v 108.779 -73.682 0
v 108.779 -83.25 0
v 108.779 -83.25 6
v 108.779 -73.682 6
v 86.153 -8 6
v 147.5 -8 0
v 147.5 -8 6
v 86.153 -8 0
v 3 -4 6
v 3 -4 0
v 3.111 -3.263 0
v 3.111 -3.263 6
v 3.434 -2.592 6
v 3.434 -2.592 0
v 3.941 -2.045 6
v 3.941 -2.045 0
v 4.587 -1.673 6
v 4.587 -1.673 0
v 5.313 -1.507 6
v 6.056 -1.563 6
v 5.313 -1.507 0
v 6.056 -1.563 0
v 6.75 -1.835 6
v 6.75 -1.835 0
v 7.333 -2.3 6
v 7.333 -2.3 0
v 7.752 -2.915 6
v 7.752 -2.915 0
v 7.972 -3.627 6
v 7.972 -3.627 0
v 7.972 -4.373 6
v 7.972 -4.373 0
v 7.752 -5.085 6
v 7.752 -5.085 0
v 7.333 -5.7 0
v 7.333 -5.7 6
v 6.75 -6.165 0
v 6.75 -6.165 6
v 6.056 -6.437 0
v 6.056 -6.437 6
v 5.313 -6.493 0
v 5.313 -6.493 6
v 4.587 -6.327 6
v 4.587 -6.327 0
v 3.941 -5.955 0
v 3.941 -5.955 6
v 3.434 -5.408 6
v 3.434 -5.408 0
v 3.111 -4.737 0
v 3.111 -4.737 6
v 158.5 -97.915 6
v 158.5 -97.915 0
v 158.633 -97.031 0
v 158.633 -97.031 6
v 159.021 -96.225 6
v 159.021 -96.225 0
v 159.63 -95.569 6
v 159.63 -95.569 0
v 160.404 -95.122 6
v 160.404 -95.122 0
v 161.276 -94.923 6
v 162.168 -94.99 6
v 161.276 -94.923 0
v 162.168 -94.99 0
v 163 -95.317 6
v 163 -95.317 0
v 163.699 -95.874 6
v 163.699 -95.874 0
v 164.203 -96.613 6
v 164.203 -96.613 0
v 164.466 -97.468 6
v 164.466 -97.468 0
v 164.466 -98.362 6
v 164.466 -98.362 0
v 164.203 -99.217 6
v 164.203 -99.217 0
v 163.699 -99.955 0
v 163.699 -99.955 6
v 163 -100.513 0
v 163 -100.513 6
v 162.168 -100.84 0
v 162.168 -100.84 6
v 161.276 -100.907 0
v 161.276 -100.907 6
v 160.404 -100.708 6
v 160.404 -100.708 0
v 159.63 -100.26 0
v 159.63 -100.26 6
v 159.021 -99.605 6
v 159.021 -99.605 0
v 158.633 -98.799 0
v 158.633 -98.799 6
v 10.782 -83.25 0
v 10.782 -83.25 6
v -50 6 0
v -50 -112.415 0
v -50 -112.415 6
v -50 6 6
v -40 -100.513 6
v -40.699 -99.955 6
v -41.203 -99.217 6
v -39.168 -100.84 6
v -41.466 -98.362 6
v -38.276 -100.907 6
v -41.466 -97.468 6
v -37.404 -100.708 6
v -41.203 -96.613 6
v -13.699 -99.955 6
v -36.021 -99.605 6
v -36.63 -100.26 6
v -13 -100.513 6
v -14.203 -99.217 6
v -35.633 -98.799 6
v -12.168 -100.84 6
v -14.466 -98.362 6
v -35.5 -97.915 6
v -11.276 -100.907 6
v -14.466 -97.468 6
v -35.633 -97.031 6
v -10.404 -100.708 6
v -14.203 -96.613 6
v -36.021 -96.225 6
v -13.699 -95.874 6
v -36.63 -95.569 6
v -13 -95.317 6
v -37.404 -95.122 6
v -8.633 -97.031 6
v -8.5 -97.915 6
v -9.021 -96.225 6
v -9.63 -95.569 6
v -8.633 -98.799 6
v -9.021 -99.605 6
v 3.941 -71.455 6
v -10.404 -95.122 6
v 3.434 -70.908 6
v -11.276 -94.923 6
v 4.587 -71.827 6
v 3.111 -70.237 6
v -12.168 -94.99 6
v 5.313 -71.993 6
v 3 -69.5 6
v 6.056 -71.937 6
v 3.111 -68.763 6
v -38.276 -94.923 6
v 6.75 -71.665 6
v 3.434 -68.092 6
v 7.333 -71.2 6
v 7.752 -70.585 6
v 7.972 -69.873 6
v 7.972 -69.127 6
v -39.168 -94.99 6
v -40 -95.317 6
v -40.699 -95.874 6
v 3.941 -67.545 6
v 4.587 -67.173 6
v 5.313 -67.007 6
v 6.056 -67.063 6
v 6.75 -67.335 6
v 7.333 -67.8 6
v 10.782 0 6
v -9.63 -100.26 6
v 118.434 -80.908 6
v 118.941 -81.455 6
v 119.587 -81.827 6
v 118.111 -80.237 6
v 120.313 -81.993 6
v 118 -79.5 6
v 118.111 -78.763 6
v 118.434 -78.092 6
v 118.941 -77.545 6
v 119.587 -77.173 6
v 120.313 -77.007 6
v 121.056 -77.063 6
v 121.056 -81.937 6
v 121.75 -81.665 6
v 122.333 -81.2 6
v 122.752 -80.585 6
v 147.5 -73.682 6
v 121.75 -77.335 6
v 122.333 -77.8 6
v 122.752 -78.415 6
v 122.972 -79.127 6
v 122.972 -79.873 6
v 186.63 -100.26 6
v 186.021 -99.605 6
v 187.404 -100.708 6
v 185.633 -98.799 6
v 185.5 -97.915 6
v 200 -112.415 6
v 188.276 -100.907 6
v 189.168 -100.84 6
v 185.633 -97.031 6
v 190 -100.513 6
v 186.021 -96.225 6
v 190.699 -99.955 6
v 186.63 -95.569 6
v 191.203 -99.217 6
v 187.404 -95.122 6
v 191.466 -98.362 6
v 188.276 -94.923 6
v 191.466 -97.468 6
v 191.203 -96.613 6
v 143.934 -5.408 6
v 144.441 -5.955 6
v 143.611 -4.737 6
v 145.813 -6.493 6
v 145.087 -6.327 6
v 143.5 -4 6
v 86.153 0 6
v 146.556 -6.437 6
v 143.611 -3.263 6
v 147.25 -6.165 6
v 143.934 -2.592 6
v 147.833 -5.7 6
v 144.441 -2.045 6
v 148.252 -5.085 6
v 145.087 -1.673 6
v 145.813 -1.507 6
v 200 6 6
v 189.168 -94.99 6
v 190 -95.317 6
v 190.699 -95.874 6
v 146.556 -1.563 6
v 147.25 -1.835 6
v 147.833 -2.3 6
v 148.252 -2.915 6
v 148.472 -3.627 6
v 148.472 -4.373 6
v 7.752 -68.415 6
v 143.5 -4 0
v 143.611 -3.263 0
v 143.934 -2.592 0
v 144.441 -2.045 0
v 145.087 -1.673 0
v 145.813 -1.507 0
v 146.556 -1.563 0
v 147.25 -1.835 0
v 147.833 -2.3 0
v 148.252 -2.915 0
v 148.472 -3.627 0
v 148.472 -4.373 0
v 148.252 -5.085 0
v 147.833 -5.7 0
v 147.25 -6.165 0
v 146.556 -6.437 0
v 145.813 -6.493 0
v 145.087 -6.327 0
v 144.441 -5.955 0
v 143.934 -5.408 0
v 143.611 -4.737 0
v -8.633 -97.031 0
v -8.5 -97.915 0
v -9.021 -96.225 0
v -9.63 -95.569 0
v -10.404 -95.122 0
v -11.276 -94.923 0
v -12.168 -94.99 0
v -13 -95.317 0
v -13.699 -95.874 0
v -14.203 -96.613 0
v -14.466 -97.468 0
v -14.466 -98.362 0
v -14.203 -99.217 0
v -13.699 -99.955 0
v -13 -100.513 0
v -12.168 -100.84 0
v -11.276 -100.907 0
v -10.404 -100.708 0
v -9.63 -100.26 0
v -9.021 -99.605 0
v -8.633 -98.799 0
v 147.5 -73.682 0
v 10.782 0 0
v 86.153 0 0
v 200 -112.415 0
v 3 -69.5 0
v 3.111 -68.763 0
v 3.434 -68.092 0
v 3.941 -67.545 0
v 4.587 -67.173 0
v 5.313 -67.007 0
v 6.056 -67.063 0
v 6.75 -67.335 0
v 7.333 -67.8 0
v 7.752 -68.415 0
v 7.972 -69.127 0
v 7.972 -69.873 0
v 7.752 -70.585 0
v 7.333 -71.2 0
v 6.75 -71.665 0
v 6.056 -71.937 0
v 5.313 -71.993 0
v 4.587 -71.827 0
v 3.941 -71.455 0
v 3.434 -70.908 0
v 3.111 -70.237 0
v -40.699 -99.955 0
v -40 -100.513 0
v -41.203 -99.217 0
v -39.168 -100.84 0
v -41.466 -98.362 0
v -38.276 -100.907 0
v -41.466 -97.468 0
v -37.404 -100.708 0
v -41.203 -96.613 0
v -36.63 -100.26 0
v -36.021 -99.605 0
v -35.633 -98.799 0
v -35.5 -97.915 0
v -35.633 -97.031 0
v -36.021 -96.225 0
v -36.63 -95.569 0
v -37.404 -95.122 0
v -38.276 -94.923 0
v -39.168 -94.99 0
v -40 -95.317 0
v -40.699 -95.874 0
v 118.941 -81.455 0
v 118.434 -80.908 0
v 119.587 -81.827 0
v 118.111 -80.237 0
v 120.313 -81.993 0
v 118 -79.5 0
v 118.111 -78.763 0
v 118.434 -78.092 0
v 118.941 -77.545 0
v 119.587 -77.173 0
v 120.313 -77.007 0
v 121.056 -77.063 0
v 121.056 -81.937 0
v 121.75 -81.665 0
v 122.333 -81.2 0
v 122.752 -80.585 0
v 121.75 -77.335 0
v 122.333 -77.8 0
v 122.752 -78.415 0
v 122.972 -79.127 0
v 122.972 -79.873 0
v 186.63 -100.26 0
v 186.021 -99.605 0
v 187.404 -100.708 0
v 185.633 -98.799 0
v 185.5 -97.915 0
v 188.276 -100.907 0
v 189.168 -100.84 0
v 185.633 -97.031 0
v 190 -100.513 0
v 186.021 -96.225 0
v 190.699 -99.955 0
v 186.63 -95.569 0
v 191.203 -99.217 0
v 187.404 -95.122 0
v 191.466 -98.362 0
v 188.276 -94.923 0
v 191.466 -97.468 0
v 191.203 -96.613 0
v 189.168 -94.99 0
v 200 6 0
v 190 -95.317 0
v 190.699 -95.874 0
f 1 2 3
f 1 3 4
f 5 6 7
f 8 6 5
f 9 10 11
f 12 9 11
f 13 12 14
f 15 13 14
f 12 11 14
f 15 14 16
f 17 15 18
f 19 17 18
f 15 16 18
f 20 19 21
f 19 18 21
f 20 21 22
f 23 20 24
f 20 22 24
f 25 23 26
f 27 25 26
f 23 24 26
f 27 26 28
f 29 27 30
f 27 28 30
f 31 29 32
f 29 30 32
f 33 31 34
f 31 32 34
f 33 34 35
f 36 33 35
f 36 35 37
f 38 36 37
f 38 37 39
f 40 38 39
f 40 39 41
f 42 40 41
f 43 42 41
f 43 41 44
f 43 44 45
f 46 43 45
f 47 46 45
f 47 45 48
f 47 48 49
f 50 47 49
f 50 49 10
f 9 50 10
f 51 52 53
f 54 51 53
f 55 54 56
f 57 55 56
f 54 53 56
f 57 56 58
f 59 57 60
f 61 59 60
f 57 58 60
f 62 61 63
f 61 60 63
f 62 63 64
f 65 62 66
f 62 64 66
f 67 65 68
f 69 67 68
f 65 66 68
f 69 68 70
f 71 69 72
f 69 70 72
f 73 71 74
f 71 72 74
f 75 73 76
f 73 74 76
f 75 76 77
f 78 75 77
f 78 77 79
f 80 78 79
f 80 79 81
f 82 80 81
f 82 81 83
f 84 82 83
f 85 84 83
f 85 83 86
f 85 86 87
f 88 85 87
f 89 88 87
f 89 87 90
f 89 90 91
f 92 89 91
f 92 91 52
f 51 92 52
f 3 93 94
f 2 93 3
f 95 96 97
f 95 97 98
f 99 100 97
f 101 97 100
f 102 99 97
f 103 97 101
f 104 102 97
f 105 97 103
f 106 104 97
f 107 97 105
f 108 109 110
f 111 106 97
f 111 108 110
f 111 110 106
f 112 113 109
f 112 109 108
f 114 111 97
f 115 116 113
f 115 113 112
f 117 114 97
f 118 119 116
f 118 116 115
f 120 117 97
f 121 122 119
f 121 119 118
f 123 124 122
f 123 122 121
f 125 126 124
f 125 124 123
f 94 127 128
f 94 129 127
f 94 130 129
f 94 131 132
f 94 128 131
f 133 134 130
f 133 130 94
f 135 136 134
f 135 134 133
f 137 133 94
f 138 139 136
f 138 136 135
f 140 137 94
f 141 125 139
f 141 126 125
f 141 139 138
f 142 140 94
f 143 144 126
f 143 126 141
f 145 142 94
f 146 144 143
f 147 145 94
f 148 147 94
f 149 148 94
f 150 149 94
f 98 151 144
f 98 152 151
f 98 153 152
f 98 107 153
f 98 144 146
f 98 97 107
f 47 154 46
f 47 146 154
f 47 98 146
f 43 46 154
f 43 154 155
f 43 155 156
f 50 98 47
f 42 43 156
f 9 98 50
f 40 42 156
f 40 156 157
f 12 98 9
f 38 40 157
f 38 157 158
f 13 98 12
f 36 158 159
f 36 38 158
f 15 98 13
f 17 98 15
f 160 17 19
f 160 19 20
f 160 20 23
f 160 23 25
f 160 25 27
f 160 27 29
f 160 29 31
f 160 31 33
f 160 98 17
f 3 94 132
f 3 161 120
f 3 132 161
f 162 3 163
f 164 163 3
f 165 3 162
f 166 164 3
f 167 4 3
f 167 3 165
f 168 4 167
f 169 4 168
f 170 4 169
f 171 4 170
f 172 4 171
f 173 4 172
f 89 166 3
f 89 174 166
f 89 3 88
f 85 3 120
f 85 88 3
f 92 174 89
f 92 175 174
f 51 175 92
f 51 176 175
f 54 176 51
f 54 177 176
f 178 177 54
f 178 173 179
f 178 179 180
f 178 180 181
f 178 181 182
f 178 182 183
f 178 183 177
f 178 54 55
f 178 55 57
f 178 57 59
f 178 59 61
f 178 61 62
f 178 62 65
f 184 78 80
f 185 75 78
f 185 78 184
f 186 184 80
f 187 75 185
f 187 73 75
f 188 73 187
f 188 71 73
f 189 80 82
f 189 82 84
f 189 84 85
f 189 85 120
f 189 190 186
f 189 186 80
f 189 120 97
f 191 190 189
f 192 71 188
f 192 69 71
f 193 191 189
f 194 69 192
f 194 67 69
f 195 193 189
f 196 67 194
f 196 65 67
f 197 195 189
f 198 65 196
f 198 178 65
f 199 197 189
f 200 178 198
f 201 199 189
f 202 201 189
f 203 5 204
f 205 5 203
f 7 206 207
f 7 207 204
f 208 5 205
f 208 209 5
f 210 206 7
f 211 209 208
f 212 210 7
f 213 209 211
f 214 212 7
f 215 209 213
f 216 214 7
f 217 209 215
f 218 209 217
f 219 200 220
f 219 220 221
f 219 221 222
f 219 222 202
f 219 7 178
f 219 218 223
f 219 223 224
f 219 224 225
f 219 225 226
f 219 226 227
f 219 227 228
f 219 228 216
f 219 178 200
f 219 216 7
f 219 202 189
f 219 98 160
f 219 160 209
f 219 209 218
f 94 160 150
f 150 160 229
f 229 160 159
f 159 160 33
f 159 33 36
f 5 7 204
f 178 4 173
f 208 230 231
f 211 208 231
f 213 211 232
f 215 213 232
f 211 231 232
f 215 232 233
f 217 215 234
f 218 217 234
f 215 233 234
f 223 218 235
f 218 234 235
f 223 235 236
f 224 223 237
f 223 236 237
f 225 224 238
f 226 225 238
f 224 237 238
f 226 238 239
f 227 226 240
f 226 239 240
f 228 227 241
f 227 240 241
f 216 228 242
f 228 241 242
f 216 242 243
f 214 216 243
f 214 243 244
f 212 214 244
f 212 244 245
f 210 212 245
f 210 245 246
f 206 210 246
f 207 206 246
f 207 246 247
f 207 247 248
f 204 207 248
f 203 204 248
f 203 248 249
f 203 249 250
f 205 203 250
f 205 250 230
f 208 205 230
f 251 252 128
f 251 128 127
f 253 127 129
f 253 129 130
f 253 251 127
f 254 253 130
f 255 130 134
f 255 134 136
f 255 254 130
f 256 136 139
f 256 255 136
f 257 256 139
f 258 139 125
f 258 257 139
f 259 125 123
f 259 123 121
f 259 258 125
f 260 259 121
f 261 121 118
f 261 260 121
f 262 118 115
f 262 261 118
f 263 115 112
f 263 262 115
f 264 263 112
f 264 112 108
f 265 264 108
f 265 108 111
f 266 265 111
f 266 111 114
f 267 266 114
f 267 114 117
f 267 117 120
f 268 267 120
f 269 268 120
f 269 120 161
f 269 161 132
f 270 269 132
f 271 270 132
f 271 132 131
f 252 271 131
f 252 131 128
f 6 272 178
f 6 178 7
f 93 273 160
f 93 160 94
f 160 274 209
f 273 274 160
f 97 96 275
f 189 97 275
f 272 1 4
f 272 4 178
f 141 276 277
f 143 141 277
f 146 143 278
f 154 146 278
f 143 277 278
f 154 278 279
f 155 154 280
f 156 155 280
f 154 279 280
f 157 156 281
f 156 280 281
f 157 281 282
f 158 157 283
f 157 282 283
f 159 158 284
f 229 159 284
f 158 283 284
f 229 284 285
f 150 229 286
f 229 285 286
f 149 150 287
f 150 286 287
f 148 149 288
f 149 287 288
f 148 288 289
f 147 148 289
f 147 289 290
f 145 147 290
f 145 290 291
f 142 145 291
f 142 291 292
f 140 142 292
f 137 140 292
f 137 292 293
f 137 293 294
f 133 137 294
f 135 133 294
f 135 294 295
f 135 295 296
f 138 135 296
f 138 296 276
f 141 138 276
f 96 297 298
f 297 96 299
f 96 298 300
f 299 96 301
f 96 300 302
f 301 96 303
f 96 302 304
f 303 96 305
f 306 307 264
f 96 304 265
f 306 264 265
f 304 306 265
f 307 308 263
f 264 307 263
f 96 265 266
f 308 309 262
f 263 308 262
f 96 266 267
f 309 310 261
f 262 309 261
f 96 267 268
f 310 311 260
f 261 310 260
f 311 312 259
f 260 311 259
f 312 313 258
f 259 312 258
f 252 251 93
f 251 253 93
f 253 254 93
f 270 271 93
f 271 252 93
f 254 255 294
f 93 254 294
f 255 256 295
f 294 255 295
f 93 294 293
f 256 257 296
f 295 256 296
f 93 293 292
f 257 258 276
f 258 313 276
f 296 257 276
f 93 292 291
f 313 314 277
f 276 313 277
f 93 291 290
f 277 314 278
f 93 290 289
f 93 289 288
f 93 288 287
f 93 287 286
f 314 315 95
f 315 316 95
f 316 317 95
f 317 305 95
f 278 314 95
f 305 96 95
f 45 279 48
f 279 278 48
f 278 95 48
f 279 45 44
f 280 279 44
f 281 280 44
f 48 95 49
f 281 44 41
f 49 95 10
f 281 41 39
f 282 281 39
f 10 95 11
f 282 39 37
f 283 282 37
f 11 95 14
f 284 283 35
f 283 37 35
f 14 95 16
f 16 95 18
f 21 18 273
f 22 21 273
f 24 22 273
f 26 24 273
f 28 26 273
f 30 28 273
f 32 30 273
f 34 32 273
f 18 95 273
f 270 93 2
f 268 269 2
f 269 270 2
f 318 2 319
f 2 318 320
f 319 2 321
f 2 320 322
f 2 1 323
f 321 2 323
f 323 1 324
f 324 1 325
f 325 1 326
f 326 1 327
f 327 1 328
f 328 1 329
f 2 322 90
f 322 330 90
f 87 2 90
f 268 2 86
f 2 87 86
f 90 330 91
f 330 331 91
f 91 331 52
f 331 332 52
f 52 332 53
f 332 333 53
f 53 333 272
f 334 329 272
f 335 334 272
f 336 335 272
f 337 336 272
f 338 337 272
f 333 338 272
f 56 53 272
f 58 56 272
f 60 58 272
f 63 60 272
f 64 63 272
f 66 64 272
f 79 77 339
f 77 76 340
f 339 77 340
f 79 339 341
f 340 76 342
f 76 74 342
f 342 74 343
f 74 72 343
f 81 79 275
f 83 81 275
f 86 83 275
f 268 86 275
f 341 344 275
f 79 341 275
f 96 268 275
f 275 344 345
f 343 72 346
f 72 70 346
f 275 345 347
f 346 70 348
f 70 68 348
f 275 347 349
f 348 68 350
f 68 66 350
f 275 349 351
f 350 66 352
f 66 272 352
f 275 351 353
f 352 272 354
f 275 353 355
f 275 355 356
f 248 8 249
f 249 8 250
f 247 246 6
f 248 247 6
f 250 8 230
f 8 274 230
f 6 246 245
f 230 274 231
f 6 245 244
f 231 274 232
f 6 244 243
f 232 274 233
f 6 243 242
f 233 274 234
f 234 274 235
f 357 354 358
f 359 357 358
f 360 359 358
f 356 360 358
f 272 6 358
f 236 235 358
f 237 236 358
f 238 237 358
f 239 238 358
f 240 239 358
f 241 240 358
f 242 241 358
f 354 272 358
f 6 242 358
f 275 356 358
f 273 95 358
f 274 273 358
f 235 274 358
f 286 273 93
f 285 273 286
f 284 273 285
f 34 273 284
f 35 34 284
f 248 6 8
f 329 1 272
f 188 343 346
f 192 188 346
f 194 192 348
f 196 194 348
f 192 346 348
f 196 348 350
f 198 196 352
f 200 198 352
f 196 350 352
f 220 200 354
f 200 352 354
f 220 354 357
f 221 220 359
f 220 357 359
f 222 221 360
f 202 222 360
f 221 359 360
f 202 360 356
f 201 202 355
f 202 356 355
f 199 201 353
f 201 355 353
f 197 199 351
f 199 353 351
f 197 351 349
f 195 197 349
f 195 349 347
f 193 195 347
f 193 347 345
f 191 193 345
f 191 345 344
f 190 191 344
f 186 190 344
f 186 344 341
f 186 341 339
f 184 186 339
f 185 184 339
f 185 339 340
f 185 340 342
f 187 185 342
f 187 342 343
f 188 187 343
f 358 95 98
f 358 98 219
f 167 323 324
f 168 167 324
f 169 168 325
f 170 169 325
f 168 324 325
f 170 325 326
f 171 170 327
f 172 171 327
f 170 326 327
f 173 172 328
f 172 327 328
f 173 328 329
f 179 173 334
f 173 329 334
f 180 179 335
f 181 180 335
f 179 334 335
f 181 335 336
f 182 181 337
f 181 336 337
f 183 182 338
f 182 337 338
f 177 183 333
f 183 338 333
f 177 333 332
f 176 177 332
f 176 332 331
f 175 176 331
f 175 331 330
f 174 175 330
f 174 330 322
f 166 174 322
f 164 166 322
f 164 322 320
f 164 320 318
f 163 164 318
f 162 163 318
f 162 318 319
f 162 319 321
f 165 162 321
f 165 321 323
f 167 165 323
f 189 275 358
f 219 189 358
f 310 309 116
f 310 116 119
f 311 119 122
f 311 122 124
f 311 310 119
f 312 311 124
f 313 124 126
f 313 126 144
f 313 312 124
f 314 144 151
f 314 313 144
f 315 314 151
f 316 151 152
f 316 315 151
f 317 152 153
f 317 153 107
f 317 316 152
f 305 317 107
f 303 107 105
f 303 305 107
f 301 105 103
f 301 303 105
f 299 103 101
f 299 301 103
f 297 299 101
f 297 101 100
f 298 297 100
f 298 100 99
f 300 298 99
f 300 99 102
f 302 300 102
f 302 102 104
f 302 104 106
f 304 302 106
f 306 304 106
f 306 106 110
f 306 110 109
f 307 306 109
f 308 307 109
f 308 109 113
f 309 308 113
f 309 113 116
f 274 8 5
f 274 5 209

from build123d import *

# Parameters (mm, degrees)
ESQUISSE1_W             = 250
ESQUISSE1_H             = 118.414906094
BOSS_EXTRU_1_DEPTH      = 6
ENL_V_MAT_EXTRU_1_REACH = 231.506
ENL_V_MAT_EXTRU_2_REACH = 231.506
ESQUISSE3_R             = 2.5
ENL_V_MAT_EXTRU_3_REACH = 231.506
ESQUISSE4_R             = 3


with BuildPart() as part:
    # Esquisse1 → Boss.-Extru.1 (new body)
    with BuildSketch(Plane.XY):
        with Locations((75, -53.207453047)):
            Rectangle(ESQUISSE1_W, ESQUISSE1_H)
    extrude(amount=BOSS_EXTRU_1_DEPTH)

    # Esquisse2 → Enlèv. mat.-Extru.1 (cut, up to next)
    with BuildSketch(Plane(origin=(0, 0, 0), x_dir=(-1, 0, 0), z_dir=(0, 0, -1)), mode=Mode.PRIVATE) as enl_v_mat_extru_1_sk1:
        Polygon((-10.782435162, 0), (-10.782435162, -83.25), (-108.778675483, -83.25), (-108.778675483, -73.68186315), (-147.5, -73.68186315), (-147.5, -8), (-86.152674603, -8), (-86.152674603, 0), align=None)
    enl_v_mat_extru_1_tool1 = extrude(enl_v_mat_extru_1_sk1.sketch, amount=-ENL_V_MAT_EXTRU_1_REACH, mode=Mode.PRIVATE) & part.part
    add(enl_v_mat_extru_1_tool1.solids().sort_by_distance((75.657683, -42.082804, 0))[0], mode=Mode.SUBTRACT)

    # Esquisse3 → Enlèv. mat.-Extru.2 (cut, up to next)
    with BuildSketch(Plane(origin=(0, 0, 0), x_dir=(-1, 0, 0), z_dir=(0, 0, -1)), mode=Mode.PRIVATE) as enl_v_mat_extru_2_sk1:
        with Locations((-5.5, -69.5)):
            Circle(ESQUISSE3_R)
    enl_v_mat_extru_2_tool1 = extrude(enl_v_mat_extru_2_sk1.sketch, amount=-ENL_V_MAT_EXTRU_2_REACH, mode=Mode.PRIVATE) & part.part
    # Esquisse3 → Enlèv. mat.-Extru.2 (cut, up to next)
    with BuildSketch(Plane(origin=(0, 0, 0), x_dir=(-1, 0, 0), z_dir=(0, 0, -1)), mode=Mode.PRIVATE) as enl_v_mat_extru_2_sk2:
        with Locations((-5.5, -4)):
            Circle(ESQUISSE3_R)
    enl_v_mat_extru_2_tool2 = extrude(enl_v_mat_extru_2_sk2.sketch, amount=-ENL_V_MAT_EXTRU_2_REACH, mode=Mode.PRIVATE) & part.part
    # Esquisse3 → Enlèv. mat.-Extru.2 (cut, up to next)
    with BuildSketch(Plane(origin=(0, 0, 0), x_dir=(-1, 0, 0), z_dir=(0, 0, -1)), mode=Mode.PRIVATE) as enl_v_mat_extru_2_sk3:
        with Locations((-146, -4)):
            Circle(ESQUISSE3_R)
    enl_v_mat_extru_2_tool3 = extrude(enl_v_mat_extru_2_sk3.sketch, amount=-ENL_V_MAT_EXTRU_2_REACH, mode=Mode.PRIVATE) & part.part
    # Esquisse3 → Enlèv. mat.-Extru.2 (cut, up to next)
    with BuildSketch(Plane(origin=(0, 0, 0), x_dir=(-1, 0, 0), z_dir=(0, 0, -1)), mode=Mode.PRIVATE) as enl_v_mat_extru_2_sk4:
        with Locations((-120.5, -79.5)):
            Circle(ESQUISSE3_R)
    enl_v_mat_extru_2_tool4 = extrude(enl_v_mat_extru_2_sk4.sketch, amount=-ENL_V_MAT_EXTRU_2_REACH, mode=Mode.PRIVATE) & part.part
    add(enl_v_mat_extru_2_tool1.solids().sort_by_distance((5.5, -69.5, 0))[0], mode=Mode.SUBTRACT)
    add(enl_v_mat_extru_2_tool2.solids().sort_by_distance((5.5, -4, 0))[0], mode=Mode.SUBTRACT)
    add(enl_v_mat_extru_2_tool3.solids().sort_by_distance((146, -4, 0))[0], mode=Mode.SUBTRACT)
    add(enl_v_mat_extru_2_tool4.solids().sort_by_distance((120.5, -79.5, 0))[0], mode=Mode.SUBTRACT)

    # Esquisse4 → Enlèv. mat.-Extru.3 (cut, up to next)
    with BuildSketch(Plane(origin=(0, 0, 0), x_dir=(-1, 0, 0), z_dir=(0, 0, -1)), mode=Mode.PRIVATE) as enl_v_mat_extru_3_sk1:
        with Locations((-188.5, -97.914906094)):
            Circle(ESQUISSE4_R)
    enl_v_mat_extru_3_tool1 = extrude(enl_v_mat_extru_3_sk1.sketch, amount=-ENL_V_MAT_EXTRU_3_REACH, mode=Mode.PRIVATE) & part.part
    # Esquisse4 → Enlèv. mat.-Extru.3 (cut, up to next)
    with BuildSketch(Plane(origin=(0, 0, 0), x_dir=(-1, 0, 0), z_dir=(0, 0, -1)), mode=Mode.PRIVATE) as enl_v_mat_extru_3_sk2:
        with Locations((-161.5, -97.914906094)):
            Circle(ESQUISSE4_R)
    enl_v_mat_extru_3_tool2 = extrude(enl_v_mat_extru_3_sk2.sketch, amount=-ENL_V_MAT_EXTRU_3_REACH, mode=Mode.PRIVATE) & part.part
    enl_v_mat_extru_3_1 = enl_v_mat_extru_3_tool1.solids().sort_by_distance((188.5, -97.914906, 0))[0]
    add(enl_v_mat_extru_3_1, mode=Mode.SUBTRACT)
    enl_v_mat_extru_3_2 = enl_v_mat_extru_3_tool2.solids().sort_by_distance((161.5, -97.914906, 0))[0]
    add(enl_v_mat_extru_3_2, mode=Mode.SUBTRACT)
    enl_v_mat_extru_3 = enl_v_mat_extru_3_1 + enl_v_mat_extru_3_2  # Enlèv. mat.-Extru.3 as one shape, for the pattern or mirror that repeats it

    # Symétrie1: Enlèv. mat.-Extru.3 across plane
    add(enl_v_mat_extru_3.mirror(Plane(origin=(75, 0, 0), x_dir=(0, 0, 1), z_dir=(1, 0, 0))), mode=Mode.SUBTRACT)


solid = part.part
